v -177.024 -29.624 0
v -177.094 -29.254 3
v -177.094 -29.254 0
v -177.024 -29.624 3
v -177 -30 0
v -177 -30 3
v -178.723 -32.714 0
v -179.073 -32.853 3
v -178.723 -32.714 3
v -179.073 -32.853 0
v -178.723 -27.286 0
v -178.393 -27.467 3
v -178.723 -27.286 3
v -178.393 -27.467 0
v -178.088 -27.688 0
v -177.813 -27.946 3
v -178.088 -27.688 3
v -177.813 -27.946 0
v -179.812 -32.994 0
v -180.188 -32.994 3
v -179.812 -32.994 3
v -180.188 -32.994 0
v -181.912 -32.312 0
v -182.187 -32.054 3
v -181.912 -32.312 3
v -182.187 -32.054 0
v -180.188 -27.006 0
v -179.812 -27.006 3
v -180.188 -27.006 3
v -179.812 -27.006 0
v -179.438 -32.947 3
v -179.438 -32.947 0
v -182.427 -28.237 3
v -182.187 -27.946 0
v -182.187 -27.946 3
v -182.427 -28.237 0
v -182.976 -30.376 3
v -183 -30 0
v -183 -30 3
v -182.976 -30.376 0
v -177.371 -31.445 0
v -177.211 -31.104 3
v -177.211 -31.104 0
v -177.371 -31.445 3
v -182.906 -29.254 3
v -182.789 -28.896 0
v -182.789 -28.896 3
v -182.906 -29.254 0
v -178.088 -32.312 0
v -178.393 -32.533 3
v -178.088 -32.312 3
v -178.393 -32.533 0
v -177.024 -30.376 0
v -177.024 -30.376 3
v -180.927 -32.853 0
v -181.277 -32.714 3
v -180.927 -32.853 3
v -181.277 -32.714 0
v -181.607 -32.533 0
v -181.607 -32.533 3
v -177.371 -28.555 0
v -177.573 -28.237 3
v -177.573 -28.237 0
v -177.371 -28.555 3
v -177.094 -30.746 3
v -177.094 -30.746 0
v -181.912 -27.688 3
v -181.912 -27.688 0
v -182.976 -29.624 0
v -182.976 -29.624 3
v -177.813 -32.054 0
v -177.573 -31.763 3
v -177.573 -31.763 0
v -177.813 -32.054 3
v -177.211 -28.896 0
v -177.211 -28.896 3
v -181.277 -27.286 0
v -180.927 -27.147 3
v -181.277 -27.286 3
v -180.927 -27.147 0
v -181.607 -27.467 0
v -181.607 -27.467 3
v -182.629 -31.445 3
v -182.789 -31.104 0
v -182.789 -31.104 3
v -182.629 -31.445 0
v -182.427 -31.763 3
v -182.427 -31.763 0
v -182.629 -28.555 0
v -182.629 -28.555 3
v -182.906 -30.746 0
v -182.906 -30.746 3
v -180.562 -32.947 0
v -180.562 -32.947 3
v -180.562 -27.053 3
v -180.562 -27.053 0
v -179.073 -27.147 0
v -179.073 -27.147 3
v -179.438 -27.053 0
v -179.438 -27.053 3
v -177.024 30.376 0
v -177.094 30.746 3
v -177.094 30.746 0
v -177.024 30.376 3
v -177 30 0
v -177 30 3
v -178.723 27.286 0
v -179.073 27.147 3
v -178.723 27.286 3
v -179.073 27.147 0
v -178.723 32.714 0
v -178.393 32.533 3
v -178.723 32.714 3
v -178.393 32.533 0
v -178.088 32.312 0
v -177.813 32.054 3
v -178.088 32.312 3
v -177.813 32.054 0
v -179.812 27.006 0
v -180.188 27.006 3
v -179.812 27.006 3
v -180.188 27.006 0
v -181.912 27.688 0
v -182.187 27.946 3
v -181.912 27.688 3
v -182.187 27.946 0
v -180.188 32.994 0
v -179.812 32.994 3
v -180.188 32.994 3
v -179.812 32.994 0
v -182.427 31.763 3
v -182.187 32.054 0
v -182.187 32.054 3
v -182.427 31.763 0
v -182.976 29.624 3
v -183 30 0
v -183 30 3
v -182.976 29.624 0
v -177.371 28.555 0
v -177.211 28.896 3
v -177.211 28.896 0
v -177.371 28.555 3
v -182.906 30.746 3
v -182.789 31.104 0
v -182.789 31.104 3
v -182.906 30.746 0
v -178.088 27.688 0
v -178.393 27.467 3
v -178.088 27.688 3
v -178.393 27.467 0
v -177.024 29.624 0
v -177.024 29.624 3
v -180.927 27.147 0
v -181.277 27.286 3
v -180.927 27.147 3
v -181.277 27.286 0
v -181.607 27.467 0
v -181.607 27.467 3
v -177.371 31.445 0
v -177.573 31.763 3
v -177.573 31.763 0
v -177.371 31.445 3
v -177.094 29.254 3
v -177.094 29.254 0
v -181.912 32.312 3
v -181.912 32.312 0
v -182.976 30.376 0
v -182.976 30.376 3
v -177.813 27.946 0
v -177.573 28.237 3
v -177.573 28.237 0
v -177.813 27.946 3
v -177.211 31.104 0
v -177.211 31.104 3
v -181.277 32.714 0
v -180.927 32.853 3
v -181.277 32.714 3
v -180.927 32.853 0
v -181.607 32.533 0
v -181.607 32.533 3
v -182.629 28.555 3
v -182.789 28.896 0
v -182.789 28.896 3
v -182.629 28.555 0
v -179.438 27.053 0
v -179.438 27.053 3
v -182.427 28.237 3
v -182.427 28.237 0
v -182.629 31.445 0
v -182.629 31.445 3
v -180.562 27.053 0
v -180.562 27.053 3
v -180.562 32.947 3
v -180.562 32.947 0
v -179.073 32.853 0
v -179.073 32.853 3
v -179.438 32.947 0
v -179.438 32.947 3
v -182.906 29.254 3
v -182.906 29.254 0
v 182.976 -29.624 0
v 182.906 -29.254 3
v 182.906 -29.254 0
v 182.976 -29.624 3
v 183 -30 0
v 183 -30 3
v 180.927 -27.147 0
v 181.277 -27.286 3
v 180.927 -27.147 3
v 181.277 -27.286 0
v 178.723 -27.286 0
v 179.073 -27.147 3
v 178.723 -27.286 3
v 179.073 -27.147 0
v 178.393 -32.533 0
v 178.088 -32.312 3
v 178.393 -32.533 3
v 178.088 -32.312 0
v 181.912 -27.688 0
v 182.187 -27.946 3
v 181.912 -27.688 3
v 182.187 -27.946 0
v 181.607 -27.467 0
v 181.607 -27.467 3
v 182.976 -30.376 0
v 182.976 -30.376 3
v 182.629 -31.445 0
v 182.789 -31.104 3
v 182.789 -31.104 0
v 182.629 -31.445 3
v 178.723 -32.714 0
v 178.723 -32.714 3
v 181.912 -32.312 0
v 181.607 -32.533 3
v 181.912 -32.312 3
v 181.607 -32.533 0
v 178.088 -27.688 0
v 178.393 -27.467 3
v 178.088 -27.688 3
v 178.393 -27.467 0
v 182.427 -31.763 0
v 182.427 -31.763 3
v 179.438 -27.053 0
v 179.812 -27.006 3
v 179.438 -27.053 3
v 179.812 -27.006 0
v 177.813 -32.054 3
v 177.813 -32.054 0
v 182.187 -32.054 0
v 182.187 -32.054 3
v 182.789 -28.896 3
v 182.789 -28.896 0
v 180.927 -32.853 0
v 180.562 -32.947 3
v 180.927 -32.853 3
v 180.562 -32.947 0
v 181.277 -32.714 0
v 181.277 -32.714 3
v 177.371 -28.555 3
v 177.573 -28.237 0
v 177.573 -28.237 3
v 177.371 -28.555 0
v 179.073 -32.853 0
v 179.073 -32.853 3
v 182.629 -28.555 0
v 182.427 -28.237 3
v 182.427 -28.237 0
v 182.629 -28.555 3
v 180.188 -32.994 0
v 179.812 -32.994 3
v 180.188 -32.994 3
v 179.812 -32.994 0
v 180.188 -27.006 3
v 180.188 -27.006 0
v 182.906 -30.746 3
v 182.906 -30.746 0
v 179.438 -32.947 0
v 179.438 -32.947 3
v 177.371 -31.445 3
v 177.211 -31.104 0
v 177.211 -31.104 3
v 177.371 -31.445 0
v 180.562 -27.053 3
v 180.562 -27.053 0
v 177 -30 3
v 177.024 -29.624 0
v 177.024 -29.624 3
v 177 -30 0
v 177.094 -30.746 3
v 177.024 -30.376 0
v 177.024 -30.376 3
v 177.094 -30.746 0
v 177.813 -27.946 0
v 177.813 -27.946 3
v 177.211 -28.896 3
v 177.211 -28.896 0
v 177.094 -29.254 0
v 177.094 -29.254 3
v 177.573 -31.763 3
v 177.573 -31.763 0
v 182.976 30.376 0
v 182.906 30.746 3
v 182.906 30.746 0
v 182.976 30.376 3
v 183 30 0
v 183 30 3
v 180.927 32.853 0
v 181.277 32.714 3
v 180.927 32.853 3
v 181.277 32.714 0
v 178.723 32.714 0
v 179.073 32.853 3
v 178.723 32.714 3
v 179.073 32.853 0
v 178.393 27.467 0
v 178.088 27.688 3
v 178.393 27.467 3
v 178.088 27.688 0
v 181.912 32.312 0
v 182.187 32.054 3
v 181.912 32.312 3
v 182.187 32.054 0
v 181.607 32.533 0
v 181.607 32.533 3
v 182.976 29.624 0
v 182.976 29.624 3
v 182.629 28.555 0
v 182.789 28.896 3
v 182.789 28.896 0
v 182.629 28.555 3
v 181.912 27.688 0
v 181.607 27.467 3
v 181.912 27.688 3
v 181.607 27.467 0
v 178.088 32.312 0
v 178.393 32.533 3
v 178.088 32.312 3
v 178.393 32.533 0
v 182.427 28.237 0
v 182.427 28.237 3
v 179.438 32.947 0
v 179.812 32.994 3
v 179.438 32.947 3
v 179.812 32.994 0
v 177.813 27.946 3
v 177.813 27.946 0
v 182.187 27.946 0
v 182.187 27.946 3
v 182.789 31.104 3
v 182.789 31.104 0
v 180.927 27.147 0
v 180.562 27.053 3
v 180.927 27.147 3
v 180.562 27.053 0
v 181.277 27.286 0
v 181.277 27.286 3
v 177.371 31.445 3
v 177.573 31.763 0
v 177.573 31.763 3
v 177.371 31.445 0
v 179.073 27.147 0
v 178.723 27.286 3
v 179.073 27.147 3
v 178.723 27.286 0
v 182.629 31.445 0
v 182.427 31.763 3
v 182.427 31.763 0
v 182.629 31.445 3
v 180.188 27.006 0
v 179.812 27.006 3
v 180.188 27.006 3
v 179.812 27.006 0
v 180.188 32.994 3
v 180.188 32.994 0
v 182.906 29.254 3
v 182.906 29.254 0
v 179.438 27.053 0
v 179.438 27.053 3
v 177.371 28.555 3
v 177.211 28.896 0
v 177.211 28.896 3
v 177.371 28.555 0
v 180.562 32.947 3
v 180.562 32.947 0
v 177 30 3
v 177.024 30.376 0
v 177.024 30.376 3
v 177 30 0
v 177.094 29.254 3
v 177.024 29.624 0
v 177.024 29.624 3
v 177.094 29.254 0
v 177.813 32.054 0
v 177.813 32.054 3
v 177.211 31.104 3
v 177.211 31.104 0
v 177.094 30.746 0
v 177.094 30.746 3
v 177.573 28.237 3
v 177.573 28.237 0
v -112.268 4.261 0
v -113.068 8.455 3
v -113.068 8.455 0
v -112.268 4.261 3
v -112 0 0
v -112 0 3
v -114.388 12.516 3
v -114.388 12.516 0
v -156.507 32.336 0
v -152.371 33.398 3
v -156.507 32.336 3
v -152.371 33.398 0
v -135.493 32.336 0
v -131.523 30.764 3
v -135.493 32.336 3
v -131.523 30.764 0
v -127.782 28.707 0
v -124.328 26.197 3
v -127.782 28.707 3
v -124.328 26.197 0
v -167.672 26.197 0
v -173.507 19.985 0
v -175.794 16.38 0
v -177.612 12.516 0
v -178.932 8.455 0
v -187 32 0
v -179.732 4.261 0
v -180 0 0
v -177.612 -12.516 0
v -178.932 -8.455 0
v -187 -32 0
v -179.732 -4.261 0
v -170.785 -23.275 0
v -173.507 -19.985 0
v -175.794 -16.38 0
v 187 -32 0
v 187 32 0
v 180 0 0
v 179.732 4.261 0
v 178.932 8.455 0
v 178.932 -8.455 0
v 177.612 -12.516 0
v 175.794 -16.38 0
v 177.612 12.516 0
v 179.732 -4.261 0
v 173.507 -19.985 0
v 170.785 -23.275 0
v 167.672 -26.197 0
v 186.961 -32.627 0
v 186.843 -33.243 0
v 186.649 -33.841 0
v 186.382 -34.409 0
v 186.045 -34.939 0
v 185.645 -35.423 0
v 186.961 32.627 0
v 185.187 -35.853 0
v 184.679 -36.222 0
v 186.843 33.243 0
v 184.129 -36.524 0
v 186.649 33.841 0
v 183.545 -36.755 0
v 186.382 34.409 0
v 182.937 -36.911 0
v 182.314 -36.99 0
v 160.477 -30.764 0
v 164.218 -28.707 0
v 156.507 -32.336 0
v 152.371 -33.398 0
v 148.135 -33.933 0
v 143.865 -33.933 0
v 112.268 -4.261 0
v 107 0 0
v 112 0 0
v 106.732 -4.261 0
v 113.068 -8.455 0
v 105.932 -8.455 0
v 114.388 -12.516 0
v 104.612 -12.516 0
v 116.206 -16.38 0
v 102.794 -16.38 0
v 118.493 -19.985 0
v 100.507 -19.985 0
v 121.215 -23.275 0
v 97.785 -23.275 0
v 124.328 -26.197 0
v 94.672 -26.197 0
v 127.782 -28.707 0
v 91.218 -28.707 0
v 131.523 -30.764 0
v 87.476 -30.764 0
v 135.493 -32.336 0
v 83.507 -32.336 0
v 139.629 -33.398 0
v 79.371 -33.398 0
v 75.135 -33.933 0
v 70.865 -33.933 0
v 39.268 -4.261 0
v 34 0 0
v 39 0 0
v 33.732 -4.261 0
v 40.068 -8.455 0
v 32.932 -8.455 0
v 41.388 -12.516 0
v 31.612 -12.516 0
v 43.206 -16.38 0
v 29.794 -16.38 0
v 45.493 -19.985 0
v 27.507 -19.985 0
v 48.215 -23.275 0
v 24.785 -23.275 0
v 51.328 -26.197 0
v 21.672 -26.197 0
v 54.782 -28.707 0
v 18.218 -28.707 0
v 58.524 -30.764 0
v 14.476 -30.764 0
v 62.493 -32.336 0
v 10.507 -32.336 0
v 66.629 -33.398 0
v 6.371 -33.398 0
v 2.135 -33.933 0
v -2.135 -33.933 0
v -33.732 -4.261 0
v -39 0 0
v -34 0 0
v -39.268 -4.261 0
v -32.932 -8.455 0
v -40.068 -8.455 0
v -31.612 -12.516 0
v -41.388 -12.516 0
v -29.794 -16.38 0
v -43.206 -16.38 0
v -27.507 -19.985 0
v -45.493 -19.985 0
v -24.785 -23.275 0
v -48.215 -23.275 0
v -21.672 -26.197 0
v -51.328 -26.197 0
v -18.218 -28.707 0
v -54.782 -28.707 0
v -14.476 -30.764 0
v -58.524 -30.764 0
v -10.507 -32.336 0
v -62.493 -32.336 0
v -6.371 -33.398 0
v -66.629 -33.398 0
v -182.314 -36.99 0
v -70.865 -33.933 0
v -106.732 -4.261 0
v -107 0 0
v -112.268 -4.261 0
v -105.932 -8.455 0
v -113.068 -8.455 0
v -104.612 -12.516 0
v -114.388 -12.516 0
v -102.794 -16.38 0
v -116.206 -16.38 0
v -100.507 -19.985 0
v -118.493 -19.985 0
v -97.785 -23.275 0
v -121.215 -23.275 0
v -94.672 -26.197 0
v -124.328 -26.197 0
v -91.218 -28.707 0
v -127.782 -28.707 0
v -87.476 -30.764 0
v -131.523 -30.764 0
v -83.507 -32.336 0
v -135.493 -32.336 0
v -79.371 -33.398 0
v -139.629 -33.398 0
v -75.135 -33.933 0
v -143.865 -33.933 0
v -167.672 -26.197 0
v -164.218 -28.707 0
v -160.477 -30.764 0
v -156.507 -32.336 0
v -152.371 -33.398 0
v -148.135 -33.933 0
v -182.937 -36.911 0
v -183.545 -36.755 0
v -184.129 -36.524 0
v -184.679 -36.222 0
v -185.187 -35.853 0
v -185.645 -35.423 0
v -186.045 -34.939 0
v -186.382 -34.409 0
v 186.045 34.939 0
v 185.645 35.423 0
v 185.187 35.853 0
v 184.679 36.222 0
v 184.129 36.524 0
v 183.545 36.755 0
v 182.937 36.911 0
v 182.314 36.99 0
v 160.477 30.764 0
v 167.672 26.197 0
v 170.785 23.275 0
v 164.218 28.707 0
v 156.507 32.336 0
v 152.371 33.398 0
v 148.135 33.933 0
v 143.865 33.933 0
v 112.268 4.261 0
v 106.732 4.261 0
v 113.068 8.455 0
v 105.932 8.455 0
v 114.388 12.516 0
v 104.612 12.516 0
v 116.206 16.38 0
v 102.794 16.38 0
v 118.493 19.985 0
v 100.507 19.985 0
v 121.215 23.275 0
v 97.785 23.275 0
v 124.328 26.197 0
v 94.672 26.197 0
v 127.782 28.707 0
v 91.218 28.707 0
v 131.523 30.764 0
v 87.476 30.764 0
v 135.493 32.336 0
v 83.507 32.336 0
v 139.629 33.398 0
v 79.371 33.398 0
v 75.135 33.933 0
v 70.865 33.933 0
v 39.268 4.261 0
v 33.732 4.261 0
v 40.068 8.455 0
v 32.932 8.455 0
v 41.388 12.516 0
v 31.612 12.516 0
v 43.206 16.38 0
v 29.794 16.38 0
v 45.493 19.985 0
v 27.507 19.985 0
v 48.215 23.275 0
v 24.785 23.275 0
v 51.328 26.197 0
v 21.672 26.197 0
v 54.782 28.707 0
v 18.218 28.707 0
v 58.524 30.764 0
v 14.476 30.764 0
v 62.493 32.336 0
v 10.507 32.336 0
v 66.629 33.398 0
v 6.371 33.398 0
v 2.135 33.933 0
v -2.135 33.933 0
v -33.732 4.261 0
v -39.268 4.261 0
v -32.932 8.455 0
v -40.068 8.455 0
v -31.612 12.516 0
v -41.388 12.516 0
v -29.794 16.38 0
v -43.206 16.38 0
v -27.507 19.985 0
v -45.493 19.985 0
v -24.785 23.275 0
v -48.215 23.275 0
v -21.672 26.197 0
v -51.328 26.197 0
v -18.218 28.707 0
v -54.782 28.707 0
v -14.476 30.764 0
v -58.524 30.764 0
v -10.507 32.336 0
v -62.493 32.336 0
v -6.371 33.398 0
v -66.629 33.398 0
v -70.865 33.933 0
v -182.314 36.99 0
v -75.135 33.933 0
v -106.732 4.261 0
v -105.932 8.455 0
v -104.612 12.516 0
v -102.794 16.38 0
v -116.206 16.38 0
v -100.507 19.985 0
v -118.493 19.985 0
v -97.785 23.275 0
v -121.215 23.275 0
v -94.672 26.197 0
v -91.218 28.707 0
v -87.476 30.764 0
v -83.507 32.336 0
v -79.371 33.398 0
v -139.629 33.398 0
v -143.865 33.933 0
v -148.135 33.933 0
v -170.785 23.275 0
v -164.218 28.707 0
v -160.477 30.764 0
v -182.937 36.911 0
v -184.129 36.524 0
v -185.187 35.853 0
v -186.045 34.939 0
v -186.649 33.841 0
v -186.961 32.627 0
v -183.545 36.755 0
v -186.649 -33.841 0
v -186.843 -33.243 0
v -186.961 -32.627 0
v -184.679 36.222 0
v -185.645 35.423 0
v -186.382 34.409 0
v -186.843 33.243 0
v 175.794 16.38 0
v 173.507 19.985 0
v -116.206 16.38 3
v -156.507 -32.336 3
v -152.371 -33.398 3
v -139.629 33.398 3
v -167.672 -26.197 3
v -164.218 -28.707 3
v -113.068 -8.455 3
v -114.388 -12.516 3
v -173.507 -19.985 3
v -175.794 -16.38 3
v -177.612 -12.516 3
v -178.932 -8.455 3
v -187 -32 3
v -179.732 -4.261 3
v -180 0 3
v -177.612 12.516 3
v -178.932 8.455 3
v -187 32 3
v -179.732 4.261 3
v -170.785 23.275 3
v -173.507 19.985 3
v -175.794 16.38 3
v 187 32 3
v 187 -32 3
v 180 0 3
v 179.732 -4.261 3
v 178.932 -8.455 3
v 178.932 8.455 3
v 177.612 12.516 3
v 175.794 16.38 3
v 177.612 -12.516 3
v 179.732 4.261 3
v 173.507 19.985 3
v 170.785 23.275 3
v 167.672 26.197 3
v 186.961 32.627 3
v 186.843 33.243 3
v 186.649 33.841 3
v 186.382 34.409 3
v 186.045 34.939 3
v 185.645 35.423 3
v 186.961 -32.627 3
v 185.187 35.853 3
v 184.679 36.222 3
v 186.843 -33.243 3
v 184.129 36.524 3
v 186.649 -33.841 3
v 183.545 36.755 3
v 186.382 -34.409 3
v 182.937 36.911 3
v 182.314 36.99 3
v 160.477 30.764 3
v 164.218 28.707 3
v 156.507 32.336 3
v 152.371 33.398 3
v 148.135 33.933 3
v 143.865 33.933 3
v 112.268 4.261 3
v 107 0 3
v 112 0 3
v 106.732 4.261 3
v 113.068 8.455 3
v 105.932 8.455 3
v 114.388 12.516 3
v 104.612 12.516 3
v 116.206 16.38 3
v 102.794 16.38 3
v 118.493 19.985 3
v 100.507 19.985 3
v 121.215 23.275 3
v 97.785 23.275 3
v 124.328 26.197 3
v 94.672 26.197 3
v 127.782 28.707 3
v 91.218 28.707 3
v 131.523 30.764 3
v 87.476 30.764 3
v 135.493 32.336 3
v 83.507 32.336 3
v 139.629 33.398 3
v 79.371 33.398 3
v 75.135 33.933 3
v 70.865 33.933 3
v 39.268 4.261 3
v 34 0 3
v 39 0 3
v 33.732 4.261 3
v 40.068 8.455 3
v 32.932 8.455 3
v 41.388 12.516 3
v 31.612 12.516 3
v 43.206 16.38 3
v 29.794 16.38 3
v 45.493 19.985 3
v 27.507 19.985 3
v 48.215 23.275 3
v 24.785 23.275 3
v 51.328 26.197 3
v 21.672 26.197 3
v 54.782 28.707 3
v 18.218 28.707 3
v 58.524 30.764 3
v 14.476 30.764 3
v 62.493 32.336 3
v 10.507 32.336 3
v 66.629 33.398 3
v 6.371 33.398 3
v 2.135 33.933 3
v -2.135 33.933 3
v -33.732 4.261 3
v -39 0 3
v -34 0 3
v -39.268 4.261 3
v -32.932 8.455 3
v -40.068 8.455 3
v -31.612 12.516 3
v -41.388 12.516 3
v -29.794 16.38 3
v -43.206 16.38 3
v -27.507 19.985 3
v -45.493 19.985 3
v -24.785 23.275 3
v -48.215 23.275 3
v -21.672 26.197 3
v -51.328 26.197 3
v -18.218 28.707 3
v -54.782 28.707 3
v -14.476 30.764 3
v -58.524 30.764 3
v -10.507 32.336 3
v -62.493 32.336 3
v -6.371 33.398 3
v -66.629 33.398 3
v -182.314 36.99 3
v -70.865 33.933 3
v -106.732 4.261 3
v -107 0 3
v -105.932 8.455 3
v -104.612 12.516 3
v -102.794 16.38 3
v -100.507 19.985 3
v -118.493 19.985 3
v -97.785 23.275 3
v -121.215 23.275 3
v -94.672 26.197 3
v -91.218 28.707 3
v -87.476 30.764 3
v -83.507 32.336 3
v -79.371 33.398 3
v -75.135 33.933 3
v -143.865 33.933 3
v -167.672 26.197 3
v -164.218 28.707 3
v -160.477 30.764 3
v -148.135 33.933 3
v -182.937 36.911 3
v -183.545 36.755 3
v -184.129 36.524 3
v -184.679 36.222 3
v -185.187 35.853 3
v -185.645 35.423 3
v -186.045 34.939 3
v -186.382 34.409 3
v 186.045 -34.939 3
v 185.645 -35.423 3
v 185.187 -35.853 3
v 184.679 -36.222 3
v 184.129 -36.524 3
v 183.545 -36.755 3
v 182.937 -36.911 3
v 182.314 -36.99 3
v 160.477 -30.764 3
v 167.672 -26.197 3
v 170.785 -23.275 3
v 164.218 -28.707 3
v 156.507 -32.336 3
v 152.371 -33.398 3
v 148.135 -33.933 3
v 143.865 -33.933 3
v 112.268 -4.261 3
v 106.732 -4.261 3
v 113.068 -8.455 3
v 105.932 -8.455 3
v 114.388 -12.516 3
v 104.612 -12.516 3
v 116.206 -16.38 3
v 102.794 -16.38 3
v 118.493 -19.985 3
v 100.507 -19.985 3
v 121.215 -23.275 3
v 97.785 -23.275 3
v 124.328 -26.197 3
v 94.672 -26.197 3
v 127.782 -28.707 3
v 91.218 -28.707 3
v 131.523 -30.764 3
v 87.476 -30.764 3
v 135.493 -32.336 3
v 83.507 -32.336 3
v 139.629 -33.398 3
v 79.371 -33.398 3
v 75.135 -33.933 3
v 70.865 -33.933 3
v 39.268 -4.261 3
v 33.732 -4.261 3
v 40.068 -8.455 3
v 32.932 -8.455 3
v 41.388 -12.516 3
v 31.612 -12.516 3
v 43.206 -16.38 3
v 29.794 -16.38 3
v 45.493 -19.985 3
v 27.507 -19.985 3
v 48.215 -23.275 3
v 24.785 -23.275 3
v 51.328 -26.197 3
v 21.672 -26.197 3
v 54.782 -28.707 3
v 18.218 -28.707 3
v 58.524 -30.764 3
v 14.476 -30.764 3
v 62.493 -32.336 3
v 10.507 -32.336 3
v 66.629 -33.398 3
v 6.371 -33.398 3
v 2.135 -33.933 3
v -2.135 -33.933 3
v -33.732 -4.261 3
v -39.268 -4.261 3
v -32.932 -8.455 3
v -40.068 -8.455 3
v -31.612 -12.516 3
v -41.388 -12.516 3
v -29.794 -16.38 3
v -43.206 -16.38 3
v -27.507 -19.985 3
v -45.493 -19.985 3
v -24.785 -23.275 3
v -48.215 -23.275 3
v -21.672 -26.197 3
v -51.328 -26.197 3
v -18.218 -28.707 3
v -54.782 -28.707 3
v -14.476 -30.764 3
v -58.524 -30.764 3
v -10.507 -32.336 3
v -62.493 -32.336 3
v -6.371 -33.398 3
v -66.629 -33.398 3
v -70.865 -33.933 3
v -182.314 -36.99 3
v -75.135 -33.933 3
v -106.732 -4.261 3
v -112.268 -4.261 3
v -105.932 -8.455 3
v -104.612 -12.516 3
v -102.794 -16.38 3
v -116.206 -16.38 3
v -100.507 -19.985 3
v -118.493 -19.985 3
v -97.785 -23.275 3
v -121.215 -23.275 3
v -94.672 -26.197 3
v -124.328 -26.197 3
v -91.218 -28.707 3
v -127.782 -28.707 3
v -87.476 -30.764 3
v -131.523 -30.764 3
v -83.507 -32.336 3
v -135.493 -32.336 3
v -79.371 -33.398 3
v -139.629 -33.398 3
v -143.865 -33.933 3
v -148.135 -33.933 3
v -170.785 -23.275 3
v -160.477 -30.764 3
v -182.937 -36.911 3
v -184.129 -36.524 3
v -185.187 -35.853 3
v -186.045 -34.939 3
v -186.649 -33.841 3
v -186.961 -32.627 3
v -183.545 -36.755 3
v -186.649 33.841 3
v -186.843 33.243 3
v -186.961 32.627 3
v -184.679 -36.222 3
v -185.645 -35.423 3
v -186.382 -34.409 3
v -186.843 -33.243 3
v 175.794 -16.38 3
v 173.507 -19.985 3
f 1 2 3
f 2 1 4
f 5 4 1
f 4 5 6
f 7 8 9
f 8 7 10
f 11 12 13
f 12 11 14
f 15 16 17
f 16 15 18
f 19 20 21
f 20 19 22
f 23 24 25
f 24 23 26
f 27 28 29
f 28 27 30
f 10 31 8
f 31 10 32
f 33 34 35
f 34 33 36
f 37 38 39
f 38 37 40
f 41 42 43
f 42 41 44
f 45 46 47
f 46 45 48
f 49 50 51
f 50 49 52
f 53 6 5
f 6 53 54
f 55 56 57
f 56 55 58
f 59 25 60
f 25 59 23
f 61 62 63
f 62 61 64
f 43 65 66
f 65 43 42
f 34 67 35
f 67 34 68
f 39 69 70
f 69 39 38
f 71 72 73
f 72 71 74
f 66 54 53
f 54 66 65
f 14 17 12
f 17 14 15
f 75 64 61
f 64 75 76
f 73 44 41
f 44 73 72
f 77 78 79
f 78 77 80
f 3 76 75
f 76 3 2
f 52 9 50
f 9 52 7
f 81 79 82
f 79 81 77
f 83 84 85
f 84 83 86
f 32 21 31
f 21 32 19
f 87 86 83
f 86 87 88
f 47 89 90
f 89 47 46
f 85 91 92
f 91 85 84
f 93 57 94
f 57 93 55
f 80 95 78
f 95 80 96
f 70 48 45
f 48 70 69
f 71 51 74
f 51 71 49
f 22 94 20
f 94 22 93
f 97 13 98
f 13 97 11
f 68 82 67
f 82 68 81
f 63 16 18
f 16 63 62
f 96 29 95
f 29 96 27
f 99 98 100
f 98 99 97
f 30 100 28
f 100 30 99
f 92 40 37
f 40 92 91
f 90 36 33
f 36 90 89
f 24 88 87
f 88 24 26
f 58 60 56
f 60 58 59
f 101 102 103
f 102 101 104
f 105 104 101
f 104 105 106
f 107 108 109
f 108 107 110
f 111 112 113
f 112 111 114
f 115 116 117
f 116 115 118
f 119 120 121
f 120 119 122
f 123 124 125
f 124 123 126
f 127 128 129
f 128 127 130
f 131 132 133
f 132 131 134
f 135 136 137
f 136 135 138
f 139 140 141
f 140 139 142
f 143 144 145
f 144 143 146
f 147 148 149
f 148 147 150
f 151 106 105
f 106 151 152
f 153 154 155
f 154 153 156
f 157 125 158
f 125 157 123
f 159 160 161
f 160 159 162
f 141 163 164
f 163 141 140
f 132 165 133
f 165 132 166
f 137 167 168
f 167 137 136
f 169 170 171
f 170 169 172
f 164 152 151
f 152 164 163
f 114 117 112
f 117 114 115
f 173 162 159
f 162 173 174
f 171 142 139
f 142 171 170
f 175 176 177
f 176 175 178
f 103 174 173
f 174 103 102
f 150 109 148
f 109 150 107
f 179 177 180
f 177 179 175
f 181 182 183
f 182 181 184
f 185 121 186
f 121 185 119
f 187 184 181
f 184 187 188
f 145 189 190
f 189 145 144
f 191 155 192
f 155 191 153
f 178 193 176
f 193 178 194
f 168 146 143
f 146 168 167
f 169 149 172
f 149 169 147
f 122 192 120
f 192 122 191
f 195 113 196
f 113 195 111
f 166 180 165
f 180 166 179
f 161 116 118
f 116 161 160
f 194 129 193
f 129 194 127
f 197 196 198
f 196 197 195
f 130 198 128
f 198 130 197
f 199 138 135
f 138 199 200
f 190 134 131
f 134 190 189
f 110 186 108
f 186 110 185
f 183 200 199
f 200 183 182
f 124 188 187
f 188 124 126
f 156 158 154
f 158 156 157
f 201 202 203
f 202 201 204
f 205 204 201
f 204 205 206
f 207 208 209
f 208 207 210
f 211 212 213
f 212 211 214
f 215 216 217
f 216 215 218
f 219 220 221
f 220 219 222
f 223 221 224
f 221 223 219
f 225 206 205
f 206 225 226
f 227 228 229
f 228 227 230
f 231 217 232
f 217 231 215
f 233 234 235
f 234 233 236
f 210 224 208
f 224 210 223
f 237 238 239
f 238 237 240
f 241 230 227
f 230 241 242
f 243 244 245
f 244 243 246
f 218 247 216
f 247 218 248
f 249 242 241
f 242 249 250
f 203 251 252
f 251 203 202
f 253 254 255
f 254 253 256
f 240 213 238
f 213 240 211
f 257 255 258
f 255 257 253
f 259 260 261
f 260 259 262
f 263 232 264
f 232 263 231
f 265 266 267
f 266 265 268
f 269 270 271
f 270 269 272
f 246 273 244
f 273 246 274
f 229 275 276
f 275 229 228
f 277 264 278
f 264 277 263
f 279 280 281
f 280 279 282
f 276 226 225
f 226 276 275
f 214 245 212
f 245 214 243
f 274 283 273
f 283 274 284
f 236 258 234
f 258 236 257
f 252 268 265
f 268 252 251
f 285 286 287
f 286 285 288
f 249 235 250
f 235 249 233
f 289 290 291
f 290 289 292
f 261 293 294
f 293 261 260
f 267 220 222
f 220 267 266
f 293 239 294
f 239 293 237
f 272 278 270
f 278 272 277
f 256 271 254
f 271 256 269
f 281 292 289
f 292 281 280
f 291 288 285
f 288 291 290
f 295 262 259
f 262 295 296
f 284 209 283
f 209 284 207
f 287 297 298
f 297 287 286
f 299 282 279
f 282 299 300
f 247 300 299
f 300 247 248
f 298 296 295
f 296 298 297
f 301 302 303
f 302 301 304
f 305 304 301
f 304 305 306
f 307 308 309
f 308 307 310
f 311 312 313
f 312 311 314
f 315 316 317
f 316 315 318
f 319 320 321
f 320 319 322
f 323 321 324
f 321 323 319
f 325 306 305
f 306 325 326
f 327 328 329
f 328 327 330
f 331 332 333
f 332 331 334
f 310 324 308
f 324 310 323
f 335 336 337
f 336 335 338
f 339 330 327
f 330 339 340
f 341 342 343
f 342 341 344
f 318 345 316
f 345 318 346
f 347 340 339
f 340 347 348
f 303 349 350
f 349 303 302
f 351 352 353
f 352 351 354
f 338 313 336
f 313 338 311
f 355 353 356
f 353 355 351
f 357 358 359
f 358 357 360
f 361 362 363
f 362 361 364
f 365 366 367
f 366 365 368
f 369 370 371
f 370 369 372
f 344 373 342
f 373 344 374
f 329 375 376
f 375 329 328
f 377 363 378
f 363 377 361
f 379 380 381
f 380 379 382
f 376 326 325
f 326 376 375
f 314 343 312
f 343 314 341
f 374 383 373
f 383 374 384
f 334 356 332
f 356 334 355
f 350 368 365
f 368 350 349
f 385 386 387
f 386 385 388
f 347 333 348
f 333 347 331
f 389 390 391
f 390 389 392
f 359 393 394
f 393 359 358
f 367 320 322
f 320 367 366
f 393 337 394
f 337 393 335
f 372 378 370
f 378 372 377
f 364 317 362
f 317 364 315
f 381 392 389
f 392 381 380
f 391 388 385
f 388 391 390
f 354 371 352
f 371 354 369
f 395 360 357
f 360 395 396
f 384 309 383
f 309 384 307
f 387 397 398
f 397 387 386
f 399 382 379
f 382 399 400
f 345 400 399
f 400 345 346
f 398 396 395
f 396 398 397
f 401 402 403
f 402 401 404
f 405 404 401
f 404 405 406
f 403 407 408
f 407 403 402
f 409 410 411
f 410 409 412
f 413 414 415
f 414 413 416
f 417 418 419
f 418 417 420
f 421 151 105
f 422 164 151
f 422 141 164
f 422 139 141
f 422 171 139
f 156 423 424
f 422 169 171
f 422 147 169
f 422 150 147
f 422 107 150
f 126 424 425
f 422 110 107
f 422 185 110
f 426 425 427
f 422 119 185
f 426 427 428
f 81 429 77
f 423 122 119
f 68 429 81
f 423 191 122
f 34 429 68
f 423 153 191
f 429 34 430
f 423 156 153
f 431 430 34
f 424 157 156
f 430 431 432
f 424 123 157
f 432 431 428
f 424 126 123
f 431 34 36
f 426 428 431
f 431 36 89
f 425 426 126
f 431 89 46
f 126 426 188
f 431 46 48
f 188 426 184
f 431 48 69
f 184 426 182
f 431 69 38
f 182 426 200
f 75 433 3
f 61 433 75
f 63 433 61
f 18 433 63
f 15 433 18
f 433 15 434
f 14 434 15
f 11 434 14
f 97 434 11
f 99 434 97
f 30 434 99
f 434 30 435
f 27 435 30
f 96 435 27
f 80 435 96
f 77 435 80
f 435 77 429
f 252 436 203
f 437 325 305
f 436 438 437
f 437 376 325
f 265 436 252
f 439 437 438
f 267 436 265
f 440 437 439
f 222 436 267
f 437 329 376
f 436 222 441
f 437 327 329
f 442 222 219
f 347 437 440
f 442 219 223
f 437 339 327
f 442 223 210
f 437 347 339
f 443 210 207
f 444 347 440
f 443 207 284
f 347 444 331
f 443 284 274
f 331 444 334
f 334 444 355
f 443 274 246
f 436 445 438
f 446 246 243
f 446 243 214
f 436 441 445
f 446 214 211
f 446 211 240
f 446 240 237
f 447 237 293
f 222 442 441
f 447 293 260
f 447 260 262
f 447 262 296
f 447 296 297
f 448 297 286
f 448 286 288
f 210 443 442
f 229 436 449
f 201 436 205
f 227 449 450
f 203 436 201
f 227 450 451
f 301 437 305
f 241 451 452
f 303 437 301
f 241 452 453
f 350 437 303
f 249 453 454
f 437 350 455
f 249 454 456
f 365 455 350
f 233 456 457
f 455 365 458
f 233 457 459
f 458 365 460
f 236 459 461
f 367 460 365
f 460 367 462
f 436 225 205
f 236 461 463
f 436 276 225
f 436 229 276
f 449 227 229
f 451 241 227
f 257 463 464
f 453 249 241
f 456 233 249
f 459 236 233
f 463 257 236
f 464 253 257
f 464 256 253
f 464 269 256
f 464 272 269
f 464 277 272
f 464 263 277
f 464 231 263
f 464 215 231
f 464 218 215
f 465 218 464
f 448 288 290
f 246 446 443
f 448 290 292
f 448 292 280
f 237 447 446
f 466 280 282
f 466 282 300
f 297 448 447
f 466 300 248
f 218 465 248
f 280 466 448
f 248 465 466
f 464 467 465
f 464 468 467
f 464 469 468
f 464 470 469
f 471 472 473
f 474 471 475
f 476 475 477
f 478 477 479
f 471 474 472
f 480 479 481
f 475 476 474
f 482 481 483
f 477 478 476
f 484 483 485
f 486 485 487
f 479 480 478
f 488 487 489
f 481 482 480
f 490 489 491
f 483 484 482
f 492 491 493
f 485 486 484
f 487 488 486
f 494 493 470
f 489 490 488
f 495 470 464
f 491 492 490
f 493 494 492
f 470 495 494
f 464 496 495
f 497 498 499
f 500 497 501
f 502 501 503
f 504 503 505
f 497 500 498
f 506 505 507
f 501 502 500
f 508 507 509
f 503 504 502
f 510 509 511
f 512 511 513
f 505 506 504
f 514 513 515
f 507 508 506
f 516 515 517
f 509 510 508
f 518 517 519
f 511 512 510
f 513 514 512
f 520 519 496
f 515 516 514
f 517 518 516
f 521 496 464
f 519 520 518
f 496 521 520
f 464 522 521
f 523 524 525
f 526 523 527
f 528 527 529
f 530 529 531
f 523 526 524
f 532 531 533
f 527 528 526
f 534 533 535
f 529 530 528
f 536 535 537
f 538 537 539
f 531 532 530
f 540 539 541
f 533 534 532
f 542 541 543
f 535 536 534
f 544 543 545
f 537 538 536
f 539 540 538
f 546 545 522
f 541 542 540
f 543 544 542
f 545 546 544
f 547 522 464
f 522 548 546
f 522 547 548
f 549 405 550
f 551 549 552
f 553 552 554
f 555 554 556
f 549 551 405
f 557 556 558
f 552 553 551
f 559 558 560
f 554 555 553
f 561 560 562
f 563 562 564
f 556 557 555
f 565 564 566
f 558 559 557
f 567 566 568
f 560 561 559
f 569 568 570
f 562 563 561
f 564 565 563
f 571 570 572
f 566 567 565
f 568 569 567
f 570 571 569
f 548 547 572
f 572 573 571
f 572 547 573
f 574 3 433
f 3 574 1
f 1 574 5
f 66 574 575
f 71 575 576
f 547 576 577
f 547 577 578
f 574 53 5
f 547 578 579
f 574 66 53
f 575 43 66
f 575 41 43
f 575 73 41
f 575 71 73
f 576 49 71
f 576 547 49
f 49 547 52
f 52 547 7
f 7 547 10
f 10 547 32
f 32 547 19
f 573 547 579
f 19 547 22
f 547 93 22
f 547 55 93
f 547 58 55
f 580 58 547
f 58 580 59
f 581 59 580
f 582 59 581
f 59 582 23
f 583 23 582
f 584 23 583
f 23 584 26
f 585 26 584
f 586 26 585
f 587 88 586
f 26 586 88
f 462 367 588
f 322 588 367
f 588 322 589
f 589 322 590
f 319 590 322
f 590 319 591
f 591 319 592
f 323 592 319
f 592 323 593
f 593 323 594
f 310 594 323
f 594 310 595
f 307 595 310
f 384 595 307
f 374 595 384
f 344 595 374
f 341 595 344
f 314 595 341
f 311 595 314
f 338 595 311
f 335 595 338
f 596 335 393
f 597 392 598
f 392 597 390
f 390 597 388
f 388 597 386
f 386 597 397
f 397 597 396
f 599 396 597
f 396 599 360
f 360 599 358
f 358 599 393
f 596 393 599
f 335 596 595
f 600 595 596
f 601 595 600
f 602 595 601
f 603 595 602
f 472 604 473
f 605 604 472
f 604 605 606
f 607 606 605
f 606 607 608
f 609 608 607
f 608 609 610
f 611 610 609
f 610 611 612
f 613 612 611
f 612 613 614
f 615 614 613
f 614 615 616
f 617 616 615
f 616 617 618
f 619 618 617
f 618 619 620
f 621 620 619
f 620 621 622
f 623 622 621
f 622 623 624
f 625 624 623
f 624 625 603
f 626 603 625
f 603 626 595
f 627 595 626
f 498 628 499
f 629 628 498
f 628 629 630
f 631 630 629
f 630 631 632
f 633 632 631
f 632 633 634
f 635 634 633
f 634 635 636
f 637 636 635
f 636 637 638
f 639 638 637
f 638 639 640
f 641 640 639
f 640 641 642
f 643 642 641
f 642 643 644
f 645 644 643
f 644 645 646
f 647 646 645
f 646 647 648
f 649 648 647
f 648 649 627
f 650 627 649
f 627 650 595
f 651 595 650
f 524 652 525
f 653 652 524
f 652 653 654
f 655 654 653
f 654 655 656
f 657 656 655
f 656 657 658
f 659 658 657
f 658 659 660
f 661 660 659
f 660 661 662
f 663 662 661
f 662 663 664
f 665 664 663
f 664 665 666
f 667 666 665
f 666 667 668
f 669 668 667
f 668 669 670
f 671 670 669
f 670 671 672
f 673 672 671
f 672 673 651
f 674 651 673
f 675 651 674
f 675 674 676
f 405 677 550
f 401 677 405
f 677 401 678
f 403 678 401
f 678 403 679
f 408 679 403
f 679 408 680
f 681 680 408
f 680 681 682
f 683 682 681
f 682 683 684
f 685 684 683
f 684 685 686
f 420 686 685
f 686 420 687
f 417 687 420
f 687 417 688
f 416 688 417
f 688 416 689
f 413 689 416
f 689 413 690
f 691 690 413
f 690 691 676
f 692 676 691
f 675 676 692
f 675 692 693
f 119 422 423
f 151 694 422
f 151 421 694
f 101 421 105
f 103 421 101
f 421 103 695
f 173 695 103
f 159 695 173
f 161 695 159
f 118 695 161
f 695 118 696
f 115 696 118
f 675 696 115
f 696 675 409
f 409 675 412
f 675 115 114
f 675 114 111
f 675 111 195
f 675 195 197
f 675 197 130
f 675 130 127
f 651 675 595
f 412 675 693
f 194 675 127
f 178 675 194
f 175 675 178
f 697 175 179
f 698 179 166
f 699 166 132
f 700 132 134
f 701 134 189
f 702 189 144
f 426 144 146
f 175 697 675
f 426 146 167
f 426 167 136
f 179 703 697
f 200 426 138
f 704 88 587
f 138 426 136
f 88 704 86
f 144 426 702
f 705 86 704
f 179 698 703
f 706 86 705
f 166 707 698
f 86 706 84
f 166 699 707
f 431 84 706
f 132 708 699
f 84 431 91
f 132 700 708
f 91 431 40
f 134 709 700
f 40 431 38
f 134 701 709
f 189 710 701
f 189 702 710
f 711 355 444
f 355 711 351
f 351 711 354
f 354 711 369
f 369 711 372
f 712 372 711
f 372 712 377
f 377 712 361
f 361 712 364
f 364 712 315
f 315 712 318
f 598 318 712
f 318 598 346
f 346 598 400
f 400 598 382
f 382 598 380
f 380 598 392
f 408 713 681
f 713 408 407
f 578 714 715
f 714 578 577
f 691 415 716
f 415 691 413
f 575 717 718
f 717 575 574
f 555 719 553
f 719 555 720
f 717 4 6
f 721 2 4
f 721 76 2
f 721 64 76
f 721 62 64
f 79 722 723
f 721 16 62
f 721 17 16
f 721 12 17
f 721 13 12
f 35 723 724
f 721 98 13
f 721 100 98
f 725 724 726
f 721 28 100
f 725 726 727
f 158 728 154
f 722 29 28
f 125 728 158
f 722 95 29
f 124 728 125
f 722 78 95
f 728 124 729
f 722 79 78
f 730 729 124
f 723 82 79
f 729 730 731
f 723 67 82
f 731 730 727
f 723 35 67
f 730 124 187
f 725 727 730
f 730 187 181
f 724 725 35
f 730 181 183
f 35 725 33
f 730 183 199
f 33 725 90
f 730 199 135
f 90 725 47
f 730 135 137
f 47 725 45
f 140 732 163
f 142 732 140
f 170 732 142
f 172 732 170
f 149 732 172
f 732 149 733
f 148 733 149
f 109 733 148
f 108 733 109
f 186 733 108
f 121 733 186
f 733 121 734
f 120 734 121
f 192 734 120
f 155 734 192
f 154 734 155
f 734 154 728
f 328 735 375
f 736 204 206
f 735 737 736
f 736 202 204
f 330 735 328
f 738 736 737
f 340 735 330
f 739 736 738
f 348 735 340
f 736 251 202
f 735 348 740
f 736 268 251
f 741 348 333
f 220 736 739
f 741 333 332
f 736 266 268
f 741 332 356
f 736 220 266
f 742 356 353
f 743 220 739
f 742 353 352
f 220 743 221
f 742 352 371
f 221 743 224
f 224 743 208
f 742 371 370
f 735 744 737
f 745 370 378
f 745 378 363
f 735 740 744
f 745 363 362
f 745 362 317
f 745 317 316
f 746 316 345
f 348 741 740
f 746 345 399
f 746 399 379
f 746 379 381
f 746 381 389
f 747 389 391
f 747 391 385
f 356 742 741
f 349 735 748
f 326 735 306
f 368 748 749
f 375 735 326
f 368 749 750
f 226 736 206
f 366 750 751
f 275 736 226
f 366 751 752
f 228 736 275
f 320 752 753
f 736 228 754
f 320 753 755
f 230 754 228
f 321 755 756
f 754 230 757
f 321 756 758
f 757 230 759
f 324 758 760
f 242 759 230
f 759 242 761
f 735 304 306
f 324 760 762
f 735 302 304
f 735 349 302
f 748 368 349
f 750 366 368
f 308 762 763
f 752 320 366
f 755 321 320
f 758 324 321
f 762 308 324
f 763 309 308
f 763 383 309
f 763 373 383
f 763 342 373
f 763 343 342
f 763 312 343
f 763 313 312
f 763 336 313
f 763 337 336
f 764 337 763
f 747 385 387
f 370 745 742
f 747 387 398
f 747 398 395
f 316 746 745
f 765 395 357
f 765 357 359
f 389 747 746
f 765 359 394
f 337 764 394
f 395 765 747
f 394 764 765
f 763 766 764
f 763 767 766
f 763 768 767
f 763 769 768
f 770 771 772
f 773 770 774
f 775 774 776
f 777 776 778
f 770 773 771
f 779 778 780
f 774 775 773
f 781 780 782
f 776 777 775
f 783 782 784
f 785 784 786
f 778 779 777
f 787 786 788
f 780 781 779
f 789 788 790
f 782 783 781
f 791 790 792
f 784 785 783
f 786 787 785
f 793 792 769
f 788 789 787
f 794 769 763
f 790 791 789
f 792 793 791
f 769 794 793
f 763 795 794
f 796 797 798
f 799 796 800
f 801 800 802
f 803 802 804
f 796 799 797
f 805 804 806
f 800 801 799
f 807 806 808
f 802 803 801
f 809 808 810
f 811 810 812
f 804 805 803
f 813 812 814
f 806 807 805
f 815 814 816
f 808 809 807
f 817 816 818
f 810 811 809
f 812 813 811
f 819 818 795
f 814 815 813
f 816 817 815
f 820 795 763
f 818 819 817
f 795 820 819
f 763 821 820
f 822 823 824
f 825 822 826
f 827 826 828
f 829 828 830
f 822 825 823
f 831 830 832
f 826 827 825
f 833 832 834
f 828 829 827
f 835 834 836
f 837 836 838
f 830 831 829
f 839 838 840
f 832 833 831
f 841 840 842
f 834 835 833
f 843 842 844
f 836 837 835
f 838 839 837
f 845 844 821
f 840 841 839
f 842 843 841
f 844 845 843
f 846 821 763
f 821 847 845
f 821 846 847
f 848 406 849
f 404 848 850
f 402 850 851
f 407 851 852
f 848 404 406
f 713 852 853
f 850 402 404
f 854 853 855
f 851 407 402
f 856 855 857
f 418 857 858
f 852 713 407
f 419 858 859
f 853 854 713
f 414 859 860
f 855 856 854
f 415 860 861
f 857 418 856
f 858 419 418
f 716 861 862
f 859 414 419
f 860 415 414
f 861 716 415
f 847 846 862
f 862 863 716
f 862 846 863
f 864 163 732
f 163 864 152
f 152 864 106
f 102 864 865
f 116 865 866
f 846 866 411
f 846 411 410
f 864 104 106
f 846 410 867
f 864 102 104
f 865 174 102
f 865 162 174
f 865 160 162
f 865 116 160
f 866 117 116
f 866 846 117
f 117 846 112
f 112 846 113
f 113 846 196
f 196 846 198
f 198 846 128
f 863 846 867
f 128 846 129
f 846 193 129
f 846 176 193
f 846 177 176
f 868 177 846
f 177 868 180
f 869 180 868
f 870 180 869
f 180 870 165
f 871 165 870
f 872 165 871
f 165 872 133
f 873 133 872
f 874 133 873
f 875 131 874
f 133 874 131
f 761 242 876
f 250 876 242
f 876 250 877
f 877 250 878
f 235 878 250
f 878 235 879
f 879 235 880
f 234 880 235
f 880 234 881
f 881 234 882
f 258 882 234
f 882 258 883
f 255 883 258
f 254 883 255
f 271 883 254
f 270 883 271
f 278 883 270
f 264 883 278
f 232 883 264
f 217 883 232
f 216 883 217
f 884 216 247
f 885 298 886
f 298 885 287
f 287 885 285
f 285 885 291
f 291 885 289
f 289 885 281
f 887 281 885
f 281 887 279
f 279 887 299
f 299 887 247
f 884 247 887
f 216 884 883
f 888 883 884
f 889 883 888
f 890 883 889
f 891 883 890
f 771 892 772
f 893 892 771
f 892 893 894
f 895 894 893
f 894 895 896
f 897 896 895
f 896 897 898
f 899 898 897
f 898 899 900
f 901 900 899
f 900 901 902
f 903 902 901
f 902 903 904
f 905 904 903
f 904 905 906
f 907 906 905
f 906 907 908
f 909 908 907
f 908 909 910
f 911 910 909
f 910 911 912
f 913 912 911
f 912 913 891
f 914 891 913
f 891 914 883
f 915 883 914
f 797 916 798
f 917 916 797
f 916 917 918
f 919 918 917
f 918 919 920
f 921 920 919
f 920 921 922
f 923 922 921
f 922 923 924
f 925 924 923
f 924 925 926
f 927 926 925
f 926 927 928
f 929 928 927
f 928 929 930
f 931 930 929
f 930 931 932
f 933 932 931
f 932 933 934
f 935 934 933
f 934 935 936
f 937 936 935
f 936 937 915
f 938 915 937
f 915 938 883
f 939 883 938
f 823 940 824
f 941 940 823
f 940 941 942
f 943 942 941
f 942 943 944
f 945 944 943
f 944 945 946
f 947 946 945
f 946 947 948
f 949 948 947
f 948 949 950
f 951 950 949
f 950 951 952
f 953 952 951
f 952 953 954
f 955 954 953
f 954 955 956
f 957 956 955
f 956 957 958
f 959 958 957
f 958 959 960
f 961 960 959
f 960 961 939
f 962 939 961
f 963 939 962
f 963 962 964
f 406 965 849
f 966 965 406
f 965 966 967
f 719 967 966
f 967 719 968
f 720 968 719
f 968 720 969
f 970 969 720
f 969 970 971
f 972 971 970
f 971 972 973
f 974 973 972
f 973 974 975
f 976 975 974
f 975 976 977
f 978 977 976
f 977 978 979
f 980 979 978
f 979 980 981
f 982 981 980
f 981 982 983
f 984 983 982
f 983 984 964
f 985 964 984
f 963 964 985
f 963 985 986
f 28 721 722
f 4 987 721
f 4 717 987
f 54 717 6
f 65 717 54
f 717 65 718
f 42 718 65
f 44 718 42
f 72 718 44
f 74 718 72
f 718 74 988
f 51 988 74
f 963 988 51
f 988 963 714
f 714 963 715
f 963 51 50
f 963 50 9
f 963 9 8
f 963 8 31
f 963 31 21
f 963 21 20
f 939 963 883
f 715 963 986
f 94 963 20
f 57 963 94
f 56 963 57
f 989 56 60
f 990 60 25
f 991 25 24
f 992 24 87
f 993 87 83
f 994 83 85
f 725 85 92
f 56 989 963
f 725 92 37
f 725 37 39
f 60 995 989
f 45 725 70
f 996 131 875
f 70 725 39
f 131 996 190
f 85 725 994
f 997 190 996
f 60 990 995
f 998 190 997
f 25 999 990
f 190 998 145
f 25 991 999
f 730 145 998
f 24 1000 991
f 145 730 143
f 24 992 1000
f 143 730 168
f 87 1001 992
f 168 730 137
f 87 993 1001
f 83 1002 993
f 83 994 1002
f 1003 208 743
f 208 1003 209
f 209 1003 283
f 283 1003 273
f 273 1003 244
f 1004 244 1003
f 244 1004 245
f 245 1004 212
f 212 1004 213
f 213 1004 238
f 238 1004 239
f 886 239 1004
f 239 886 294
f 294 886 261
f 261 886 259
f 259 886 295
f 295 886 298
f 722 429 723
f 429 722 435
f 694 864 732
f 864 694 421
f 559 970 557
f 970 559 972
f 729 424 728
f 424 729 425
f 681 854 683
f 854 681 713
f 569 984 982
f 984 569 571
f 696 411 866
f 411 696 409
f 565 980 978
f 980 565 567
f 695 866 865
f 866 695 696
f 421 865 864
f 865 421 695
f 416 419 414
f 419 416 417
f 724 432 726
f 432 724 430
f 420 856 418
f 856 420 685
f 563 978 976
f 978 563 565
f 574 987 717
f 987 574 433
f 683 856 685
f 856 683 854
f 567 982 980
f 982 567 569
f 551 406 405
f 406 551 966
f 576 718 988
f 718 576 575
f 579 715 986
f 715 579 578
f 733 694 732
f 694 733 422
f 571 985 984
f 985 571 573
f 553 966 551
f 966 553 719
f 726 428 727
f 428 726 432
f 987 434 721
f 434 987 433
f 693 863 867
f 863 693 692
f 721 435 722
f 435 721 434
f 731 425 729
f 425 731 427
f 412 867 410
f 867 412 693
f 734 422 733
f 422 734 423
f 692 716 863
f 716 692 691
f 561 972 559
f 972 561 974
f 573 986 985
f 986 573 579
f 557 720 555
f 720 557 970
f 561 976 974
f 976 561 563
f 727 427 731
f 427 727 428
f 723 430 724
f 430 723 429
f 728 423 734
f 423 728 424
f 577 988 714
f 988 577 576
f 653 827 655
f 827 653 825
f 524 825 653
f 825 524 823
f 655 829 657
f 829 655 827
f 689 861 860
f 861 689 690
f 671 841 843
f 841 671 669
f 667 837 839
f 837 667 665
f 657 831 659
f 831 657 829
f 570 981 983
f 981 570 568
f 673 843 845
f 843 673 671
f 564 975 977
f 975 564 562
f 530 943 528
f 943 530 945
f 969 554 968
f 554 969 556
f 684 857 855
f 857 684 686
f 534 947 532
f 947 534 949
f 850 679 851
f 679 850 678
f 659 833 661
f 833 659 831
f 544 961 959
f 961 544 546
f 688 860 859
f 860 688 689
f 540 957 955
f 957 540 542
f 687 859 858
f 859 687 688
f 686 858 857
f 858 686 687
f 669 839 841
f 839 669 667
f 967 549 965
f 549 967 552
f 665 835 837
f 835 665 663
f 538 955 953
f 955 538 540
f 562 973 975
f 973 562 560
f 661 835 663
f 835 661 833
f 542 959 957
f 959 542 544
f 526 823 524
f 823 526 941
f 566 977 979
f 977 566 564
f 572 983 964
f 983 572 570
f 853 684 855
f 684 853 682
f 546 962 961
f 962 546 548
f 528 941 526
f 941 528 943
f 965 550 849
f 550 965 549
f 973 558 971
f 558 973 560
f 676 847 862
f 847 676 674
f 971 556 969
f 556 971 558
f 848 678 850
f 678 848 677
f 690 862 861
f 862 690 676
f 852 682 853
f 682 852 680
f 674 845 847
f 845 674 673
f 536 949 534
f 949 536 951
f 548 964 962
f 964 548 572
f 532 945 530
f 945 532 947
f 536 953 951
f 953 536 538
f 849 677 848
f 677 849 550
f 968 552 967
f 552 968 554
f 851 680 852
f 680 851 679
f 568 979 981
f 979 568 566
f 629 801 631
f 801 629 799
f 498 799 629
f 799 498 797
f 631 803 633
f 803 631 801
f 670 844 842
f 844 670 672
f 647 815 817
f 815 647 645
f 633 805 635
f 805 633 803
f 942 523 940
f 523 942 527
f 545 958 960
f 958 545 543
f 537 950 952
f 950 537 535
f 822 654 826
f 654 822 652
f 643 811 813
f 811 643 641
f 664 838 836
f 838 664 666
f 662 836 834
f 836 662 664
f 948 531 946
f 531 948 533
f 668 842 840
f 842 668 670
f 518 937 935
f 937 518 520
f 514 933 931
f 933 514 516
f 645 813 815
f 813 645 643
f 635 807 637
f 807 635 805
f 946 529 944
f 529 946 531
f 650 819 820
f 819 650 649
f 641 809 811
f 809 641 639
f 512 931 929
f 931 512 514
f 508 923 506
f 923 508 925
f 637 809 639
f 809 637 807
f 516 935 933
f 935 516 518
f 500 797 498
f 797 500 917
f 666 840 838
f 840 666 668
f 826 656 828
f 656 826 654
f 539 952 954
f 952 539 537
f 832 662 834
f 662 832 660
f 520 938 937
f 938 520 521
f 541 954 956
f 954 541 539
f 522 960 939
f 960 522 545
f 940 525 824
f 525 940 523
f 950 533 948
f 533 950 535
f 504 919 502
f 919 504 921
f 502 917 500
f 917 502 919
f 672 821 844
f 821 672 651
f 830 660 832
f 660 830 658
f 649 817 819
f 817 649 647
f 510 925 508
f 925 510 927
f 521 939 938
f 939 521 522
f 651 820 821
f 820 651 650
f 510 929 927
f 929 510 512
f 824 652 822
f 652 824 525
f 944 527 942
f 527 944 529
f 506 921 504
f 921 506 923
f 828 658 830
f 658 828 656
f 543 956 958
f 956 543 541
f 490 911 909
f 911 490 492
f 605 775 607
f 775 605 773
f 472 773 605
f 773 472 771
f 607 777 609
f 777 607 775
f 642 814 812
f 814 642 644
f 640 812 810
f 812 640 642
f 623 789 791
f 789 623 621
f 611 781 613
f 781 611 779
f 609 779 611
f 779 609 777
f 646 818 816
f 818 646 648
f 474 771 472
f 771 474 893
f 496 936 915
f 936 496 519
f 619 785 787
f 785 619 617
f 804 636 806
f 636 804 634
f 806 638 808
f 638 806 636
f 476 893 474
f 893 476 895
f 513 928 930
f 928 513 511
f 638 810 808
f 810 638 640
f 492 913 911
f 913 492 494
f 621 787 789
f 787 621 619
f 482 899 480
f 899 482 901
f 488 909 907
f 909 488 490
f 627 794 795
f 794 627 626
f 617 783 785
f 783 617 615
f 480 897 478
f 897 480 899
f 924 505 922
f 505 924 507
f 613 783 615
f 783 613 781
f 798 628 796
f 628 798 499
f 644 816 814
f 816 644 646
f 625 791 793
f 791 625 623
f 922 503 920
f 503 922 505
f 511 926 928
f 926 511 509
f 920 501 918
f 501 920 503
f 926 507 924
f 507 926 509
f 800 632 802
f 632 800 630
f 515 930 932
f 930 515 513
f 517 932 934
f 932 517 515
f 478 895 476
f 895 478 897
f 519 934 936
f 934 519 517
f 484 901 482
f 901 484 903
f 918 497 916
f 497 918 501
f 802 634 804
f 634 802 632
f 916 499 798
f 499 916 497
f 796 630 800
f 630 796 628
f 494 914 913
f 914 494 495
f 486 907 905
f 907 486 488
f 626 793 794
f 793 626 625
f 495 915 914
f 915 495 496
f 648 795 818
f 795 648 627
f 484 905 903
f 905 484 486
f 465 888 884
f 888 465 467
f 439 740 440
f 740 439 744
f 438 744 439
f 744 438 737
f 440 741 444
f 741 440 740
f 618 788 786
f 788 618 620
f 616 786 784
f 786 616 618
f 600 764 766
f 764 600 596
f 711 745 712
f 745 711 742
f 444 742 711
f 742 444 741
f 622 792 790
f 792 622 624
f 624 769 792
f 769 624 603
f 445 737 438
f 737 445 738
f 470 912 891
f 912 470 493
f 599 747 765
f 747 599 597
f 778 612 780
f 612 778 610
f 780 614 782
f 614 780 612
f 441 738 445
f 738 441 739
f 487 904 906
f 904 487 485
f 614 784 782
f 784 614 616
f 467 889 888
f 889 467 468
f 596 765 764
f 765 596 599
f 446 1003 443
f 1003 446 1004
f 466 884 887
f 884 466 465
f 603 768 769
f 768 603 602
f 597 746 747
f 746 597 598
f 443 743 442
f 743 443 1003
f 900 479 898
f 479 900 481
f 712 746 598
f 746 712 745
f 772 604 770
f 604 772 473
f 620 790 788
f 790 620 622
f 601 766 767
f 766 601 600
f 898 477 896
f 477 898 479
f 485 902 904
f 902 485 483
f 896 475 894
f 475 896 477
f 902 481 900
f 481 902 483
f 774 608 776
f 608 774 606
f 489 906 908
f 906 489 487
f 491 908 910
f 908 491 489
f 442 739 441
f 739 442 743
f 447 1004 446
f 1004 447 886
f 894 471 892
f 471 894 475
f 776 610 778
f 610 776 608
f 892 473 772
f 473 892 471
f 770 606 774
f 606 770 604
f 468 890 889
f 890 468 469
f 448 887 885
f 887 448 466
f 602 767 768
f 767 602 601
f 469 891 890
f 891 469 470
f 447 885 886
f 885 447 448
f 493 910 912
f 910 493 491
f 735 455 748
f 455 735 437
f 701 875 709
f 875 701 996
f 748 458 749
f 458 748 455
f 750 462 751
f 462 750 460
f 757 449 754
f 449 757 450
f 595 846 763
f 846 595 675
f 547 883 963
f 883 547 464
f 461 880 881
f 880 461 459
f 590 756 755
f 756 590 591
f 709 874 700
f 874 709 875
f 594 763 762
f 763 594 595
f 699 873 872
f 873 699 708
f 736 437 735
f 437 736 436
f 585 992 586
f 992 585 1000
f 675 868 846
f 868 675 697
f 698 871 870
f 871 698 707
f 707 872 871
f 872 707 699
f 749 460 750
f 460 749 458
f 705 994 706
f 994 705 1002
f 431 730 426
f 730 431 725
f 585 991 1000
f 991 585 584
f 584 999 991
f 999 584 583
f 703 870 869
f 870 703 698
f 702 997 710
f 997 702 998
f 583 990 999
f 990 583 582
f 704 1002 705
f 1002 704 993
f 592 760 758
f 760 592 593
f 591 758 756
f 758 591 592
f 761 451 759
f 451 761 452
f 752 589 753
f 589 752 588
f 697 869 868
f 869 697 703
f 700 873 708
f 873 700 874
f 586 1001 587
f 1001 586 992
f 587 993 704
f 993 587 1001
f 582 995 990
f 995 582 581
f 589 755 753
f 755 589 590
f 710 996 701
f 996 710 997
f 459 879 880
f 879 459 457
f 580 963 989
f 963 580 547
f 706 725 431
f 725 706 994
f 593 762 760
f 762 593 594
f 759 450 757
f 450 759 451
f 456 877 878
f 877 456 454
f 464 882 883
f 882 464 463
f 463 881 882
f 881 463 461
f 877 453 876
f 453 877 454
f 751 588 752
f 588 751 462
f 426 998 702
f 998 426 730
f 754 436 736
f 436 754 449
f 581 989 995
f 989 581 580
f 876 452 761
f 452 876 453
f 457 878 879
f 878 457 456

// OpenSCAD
$fn = 50;


difference() {
	union() {
		hull() {
			translate(v = [-182.0000000000, 32.0000000000, 0]) {
				cylinder(h = 3, r = 5);
			}
			translate(v = [182.0000000000, 32.0000000000, 0]) {
				cylinder(h = 3, r = 5);
			}
			translate(v = [-182.0000000000, -32.0000000000, 0]) {
				cylinder(h = 3, r = 5);
			}
			translate(v = [182.0000000000, -32.0000000000, 0]) {
				cylinder(h = 3, r = 5);
			}
		}
	}
	union() {
		#translate(v = [-180.0000000000, -30.0000000000, -100.0000000000]) {
			cylinder(h = 200, r = 3.0000000000);
		}
		#translate(v = [-180.0000000000, 30.0000000000, -100.0000000000]) {
			cylinder(h = 200, r = 3.0000000000);
		}
		#translate(v = [180.0000000000, -30.0000000000, -100.0000000000]) {
			cylinder(h = 200, r = 3.0000000000);
		}
		#translate(v = [180.0000000000, 30.0000000000, -100.0000000000]) {
			cylinder(h = 200, r = 3.0000000000);
		}
		#translate(v = [-146.0000000000, 0, 0]) {
			cylinder(h = 3, r = 34.0000000000);
		}
		#translate(v = [-73.0000000000, 0, 0]) {
			cylinder(h = 3, r = 34.0000000000);
		}
		#cylinder(h = 3, r = 34.0000000000);
		#translate(v = [73.0000000000, 0, 0]) {
			cylinder(h = 3, r = 34.0000000000);
		}
		#translate(v = [146.0000000000, 0, 0]) {
			cylinder(h = 3, r = 34.0000000000);
		}
	}
}
